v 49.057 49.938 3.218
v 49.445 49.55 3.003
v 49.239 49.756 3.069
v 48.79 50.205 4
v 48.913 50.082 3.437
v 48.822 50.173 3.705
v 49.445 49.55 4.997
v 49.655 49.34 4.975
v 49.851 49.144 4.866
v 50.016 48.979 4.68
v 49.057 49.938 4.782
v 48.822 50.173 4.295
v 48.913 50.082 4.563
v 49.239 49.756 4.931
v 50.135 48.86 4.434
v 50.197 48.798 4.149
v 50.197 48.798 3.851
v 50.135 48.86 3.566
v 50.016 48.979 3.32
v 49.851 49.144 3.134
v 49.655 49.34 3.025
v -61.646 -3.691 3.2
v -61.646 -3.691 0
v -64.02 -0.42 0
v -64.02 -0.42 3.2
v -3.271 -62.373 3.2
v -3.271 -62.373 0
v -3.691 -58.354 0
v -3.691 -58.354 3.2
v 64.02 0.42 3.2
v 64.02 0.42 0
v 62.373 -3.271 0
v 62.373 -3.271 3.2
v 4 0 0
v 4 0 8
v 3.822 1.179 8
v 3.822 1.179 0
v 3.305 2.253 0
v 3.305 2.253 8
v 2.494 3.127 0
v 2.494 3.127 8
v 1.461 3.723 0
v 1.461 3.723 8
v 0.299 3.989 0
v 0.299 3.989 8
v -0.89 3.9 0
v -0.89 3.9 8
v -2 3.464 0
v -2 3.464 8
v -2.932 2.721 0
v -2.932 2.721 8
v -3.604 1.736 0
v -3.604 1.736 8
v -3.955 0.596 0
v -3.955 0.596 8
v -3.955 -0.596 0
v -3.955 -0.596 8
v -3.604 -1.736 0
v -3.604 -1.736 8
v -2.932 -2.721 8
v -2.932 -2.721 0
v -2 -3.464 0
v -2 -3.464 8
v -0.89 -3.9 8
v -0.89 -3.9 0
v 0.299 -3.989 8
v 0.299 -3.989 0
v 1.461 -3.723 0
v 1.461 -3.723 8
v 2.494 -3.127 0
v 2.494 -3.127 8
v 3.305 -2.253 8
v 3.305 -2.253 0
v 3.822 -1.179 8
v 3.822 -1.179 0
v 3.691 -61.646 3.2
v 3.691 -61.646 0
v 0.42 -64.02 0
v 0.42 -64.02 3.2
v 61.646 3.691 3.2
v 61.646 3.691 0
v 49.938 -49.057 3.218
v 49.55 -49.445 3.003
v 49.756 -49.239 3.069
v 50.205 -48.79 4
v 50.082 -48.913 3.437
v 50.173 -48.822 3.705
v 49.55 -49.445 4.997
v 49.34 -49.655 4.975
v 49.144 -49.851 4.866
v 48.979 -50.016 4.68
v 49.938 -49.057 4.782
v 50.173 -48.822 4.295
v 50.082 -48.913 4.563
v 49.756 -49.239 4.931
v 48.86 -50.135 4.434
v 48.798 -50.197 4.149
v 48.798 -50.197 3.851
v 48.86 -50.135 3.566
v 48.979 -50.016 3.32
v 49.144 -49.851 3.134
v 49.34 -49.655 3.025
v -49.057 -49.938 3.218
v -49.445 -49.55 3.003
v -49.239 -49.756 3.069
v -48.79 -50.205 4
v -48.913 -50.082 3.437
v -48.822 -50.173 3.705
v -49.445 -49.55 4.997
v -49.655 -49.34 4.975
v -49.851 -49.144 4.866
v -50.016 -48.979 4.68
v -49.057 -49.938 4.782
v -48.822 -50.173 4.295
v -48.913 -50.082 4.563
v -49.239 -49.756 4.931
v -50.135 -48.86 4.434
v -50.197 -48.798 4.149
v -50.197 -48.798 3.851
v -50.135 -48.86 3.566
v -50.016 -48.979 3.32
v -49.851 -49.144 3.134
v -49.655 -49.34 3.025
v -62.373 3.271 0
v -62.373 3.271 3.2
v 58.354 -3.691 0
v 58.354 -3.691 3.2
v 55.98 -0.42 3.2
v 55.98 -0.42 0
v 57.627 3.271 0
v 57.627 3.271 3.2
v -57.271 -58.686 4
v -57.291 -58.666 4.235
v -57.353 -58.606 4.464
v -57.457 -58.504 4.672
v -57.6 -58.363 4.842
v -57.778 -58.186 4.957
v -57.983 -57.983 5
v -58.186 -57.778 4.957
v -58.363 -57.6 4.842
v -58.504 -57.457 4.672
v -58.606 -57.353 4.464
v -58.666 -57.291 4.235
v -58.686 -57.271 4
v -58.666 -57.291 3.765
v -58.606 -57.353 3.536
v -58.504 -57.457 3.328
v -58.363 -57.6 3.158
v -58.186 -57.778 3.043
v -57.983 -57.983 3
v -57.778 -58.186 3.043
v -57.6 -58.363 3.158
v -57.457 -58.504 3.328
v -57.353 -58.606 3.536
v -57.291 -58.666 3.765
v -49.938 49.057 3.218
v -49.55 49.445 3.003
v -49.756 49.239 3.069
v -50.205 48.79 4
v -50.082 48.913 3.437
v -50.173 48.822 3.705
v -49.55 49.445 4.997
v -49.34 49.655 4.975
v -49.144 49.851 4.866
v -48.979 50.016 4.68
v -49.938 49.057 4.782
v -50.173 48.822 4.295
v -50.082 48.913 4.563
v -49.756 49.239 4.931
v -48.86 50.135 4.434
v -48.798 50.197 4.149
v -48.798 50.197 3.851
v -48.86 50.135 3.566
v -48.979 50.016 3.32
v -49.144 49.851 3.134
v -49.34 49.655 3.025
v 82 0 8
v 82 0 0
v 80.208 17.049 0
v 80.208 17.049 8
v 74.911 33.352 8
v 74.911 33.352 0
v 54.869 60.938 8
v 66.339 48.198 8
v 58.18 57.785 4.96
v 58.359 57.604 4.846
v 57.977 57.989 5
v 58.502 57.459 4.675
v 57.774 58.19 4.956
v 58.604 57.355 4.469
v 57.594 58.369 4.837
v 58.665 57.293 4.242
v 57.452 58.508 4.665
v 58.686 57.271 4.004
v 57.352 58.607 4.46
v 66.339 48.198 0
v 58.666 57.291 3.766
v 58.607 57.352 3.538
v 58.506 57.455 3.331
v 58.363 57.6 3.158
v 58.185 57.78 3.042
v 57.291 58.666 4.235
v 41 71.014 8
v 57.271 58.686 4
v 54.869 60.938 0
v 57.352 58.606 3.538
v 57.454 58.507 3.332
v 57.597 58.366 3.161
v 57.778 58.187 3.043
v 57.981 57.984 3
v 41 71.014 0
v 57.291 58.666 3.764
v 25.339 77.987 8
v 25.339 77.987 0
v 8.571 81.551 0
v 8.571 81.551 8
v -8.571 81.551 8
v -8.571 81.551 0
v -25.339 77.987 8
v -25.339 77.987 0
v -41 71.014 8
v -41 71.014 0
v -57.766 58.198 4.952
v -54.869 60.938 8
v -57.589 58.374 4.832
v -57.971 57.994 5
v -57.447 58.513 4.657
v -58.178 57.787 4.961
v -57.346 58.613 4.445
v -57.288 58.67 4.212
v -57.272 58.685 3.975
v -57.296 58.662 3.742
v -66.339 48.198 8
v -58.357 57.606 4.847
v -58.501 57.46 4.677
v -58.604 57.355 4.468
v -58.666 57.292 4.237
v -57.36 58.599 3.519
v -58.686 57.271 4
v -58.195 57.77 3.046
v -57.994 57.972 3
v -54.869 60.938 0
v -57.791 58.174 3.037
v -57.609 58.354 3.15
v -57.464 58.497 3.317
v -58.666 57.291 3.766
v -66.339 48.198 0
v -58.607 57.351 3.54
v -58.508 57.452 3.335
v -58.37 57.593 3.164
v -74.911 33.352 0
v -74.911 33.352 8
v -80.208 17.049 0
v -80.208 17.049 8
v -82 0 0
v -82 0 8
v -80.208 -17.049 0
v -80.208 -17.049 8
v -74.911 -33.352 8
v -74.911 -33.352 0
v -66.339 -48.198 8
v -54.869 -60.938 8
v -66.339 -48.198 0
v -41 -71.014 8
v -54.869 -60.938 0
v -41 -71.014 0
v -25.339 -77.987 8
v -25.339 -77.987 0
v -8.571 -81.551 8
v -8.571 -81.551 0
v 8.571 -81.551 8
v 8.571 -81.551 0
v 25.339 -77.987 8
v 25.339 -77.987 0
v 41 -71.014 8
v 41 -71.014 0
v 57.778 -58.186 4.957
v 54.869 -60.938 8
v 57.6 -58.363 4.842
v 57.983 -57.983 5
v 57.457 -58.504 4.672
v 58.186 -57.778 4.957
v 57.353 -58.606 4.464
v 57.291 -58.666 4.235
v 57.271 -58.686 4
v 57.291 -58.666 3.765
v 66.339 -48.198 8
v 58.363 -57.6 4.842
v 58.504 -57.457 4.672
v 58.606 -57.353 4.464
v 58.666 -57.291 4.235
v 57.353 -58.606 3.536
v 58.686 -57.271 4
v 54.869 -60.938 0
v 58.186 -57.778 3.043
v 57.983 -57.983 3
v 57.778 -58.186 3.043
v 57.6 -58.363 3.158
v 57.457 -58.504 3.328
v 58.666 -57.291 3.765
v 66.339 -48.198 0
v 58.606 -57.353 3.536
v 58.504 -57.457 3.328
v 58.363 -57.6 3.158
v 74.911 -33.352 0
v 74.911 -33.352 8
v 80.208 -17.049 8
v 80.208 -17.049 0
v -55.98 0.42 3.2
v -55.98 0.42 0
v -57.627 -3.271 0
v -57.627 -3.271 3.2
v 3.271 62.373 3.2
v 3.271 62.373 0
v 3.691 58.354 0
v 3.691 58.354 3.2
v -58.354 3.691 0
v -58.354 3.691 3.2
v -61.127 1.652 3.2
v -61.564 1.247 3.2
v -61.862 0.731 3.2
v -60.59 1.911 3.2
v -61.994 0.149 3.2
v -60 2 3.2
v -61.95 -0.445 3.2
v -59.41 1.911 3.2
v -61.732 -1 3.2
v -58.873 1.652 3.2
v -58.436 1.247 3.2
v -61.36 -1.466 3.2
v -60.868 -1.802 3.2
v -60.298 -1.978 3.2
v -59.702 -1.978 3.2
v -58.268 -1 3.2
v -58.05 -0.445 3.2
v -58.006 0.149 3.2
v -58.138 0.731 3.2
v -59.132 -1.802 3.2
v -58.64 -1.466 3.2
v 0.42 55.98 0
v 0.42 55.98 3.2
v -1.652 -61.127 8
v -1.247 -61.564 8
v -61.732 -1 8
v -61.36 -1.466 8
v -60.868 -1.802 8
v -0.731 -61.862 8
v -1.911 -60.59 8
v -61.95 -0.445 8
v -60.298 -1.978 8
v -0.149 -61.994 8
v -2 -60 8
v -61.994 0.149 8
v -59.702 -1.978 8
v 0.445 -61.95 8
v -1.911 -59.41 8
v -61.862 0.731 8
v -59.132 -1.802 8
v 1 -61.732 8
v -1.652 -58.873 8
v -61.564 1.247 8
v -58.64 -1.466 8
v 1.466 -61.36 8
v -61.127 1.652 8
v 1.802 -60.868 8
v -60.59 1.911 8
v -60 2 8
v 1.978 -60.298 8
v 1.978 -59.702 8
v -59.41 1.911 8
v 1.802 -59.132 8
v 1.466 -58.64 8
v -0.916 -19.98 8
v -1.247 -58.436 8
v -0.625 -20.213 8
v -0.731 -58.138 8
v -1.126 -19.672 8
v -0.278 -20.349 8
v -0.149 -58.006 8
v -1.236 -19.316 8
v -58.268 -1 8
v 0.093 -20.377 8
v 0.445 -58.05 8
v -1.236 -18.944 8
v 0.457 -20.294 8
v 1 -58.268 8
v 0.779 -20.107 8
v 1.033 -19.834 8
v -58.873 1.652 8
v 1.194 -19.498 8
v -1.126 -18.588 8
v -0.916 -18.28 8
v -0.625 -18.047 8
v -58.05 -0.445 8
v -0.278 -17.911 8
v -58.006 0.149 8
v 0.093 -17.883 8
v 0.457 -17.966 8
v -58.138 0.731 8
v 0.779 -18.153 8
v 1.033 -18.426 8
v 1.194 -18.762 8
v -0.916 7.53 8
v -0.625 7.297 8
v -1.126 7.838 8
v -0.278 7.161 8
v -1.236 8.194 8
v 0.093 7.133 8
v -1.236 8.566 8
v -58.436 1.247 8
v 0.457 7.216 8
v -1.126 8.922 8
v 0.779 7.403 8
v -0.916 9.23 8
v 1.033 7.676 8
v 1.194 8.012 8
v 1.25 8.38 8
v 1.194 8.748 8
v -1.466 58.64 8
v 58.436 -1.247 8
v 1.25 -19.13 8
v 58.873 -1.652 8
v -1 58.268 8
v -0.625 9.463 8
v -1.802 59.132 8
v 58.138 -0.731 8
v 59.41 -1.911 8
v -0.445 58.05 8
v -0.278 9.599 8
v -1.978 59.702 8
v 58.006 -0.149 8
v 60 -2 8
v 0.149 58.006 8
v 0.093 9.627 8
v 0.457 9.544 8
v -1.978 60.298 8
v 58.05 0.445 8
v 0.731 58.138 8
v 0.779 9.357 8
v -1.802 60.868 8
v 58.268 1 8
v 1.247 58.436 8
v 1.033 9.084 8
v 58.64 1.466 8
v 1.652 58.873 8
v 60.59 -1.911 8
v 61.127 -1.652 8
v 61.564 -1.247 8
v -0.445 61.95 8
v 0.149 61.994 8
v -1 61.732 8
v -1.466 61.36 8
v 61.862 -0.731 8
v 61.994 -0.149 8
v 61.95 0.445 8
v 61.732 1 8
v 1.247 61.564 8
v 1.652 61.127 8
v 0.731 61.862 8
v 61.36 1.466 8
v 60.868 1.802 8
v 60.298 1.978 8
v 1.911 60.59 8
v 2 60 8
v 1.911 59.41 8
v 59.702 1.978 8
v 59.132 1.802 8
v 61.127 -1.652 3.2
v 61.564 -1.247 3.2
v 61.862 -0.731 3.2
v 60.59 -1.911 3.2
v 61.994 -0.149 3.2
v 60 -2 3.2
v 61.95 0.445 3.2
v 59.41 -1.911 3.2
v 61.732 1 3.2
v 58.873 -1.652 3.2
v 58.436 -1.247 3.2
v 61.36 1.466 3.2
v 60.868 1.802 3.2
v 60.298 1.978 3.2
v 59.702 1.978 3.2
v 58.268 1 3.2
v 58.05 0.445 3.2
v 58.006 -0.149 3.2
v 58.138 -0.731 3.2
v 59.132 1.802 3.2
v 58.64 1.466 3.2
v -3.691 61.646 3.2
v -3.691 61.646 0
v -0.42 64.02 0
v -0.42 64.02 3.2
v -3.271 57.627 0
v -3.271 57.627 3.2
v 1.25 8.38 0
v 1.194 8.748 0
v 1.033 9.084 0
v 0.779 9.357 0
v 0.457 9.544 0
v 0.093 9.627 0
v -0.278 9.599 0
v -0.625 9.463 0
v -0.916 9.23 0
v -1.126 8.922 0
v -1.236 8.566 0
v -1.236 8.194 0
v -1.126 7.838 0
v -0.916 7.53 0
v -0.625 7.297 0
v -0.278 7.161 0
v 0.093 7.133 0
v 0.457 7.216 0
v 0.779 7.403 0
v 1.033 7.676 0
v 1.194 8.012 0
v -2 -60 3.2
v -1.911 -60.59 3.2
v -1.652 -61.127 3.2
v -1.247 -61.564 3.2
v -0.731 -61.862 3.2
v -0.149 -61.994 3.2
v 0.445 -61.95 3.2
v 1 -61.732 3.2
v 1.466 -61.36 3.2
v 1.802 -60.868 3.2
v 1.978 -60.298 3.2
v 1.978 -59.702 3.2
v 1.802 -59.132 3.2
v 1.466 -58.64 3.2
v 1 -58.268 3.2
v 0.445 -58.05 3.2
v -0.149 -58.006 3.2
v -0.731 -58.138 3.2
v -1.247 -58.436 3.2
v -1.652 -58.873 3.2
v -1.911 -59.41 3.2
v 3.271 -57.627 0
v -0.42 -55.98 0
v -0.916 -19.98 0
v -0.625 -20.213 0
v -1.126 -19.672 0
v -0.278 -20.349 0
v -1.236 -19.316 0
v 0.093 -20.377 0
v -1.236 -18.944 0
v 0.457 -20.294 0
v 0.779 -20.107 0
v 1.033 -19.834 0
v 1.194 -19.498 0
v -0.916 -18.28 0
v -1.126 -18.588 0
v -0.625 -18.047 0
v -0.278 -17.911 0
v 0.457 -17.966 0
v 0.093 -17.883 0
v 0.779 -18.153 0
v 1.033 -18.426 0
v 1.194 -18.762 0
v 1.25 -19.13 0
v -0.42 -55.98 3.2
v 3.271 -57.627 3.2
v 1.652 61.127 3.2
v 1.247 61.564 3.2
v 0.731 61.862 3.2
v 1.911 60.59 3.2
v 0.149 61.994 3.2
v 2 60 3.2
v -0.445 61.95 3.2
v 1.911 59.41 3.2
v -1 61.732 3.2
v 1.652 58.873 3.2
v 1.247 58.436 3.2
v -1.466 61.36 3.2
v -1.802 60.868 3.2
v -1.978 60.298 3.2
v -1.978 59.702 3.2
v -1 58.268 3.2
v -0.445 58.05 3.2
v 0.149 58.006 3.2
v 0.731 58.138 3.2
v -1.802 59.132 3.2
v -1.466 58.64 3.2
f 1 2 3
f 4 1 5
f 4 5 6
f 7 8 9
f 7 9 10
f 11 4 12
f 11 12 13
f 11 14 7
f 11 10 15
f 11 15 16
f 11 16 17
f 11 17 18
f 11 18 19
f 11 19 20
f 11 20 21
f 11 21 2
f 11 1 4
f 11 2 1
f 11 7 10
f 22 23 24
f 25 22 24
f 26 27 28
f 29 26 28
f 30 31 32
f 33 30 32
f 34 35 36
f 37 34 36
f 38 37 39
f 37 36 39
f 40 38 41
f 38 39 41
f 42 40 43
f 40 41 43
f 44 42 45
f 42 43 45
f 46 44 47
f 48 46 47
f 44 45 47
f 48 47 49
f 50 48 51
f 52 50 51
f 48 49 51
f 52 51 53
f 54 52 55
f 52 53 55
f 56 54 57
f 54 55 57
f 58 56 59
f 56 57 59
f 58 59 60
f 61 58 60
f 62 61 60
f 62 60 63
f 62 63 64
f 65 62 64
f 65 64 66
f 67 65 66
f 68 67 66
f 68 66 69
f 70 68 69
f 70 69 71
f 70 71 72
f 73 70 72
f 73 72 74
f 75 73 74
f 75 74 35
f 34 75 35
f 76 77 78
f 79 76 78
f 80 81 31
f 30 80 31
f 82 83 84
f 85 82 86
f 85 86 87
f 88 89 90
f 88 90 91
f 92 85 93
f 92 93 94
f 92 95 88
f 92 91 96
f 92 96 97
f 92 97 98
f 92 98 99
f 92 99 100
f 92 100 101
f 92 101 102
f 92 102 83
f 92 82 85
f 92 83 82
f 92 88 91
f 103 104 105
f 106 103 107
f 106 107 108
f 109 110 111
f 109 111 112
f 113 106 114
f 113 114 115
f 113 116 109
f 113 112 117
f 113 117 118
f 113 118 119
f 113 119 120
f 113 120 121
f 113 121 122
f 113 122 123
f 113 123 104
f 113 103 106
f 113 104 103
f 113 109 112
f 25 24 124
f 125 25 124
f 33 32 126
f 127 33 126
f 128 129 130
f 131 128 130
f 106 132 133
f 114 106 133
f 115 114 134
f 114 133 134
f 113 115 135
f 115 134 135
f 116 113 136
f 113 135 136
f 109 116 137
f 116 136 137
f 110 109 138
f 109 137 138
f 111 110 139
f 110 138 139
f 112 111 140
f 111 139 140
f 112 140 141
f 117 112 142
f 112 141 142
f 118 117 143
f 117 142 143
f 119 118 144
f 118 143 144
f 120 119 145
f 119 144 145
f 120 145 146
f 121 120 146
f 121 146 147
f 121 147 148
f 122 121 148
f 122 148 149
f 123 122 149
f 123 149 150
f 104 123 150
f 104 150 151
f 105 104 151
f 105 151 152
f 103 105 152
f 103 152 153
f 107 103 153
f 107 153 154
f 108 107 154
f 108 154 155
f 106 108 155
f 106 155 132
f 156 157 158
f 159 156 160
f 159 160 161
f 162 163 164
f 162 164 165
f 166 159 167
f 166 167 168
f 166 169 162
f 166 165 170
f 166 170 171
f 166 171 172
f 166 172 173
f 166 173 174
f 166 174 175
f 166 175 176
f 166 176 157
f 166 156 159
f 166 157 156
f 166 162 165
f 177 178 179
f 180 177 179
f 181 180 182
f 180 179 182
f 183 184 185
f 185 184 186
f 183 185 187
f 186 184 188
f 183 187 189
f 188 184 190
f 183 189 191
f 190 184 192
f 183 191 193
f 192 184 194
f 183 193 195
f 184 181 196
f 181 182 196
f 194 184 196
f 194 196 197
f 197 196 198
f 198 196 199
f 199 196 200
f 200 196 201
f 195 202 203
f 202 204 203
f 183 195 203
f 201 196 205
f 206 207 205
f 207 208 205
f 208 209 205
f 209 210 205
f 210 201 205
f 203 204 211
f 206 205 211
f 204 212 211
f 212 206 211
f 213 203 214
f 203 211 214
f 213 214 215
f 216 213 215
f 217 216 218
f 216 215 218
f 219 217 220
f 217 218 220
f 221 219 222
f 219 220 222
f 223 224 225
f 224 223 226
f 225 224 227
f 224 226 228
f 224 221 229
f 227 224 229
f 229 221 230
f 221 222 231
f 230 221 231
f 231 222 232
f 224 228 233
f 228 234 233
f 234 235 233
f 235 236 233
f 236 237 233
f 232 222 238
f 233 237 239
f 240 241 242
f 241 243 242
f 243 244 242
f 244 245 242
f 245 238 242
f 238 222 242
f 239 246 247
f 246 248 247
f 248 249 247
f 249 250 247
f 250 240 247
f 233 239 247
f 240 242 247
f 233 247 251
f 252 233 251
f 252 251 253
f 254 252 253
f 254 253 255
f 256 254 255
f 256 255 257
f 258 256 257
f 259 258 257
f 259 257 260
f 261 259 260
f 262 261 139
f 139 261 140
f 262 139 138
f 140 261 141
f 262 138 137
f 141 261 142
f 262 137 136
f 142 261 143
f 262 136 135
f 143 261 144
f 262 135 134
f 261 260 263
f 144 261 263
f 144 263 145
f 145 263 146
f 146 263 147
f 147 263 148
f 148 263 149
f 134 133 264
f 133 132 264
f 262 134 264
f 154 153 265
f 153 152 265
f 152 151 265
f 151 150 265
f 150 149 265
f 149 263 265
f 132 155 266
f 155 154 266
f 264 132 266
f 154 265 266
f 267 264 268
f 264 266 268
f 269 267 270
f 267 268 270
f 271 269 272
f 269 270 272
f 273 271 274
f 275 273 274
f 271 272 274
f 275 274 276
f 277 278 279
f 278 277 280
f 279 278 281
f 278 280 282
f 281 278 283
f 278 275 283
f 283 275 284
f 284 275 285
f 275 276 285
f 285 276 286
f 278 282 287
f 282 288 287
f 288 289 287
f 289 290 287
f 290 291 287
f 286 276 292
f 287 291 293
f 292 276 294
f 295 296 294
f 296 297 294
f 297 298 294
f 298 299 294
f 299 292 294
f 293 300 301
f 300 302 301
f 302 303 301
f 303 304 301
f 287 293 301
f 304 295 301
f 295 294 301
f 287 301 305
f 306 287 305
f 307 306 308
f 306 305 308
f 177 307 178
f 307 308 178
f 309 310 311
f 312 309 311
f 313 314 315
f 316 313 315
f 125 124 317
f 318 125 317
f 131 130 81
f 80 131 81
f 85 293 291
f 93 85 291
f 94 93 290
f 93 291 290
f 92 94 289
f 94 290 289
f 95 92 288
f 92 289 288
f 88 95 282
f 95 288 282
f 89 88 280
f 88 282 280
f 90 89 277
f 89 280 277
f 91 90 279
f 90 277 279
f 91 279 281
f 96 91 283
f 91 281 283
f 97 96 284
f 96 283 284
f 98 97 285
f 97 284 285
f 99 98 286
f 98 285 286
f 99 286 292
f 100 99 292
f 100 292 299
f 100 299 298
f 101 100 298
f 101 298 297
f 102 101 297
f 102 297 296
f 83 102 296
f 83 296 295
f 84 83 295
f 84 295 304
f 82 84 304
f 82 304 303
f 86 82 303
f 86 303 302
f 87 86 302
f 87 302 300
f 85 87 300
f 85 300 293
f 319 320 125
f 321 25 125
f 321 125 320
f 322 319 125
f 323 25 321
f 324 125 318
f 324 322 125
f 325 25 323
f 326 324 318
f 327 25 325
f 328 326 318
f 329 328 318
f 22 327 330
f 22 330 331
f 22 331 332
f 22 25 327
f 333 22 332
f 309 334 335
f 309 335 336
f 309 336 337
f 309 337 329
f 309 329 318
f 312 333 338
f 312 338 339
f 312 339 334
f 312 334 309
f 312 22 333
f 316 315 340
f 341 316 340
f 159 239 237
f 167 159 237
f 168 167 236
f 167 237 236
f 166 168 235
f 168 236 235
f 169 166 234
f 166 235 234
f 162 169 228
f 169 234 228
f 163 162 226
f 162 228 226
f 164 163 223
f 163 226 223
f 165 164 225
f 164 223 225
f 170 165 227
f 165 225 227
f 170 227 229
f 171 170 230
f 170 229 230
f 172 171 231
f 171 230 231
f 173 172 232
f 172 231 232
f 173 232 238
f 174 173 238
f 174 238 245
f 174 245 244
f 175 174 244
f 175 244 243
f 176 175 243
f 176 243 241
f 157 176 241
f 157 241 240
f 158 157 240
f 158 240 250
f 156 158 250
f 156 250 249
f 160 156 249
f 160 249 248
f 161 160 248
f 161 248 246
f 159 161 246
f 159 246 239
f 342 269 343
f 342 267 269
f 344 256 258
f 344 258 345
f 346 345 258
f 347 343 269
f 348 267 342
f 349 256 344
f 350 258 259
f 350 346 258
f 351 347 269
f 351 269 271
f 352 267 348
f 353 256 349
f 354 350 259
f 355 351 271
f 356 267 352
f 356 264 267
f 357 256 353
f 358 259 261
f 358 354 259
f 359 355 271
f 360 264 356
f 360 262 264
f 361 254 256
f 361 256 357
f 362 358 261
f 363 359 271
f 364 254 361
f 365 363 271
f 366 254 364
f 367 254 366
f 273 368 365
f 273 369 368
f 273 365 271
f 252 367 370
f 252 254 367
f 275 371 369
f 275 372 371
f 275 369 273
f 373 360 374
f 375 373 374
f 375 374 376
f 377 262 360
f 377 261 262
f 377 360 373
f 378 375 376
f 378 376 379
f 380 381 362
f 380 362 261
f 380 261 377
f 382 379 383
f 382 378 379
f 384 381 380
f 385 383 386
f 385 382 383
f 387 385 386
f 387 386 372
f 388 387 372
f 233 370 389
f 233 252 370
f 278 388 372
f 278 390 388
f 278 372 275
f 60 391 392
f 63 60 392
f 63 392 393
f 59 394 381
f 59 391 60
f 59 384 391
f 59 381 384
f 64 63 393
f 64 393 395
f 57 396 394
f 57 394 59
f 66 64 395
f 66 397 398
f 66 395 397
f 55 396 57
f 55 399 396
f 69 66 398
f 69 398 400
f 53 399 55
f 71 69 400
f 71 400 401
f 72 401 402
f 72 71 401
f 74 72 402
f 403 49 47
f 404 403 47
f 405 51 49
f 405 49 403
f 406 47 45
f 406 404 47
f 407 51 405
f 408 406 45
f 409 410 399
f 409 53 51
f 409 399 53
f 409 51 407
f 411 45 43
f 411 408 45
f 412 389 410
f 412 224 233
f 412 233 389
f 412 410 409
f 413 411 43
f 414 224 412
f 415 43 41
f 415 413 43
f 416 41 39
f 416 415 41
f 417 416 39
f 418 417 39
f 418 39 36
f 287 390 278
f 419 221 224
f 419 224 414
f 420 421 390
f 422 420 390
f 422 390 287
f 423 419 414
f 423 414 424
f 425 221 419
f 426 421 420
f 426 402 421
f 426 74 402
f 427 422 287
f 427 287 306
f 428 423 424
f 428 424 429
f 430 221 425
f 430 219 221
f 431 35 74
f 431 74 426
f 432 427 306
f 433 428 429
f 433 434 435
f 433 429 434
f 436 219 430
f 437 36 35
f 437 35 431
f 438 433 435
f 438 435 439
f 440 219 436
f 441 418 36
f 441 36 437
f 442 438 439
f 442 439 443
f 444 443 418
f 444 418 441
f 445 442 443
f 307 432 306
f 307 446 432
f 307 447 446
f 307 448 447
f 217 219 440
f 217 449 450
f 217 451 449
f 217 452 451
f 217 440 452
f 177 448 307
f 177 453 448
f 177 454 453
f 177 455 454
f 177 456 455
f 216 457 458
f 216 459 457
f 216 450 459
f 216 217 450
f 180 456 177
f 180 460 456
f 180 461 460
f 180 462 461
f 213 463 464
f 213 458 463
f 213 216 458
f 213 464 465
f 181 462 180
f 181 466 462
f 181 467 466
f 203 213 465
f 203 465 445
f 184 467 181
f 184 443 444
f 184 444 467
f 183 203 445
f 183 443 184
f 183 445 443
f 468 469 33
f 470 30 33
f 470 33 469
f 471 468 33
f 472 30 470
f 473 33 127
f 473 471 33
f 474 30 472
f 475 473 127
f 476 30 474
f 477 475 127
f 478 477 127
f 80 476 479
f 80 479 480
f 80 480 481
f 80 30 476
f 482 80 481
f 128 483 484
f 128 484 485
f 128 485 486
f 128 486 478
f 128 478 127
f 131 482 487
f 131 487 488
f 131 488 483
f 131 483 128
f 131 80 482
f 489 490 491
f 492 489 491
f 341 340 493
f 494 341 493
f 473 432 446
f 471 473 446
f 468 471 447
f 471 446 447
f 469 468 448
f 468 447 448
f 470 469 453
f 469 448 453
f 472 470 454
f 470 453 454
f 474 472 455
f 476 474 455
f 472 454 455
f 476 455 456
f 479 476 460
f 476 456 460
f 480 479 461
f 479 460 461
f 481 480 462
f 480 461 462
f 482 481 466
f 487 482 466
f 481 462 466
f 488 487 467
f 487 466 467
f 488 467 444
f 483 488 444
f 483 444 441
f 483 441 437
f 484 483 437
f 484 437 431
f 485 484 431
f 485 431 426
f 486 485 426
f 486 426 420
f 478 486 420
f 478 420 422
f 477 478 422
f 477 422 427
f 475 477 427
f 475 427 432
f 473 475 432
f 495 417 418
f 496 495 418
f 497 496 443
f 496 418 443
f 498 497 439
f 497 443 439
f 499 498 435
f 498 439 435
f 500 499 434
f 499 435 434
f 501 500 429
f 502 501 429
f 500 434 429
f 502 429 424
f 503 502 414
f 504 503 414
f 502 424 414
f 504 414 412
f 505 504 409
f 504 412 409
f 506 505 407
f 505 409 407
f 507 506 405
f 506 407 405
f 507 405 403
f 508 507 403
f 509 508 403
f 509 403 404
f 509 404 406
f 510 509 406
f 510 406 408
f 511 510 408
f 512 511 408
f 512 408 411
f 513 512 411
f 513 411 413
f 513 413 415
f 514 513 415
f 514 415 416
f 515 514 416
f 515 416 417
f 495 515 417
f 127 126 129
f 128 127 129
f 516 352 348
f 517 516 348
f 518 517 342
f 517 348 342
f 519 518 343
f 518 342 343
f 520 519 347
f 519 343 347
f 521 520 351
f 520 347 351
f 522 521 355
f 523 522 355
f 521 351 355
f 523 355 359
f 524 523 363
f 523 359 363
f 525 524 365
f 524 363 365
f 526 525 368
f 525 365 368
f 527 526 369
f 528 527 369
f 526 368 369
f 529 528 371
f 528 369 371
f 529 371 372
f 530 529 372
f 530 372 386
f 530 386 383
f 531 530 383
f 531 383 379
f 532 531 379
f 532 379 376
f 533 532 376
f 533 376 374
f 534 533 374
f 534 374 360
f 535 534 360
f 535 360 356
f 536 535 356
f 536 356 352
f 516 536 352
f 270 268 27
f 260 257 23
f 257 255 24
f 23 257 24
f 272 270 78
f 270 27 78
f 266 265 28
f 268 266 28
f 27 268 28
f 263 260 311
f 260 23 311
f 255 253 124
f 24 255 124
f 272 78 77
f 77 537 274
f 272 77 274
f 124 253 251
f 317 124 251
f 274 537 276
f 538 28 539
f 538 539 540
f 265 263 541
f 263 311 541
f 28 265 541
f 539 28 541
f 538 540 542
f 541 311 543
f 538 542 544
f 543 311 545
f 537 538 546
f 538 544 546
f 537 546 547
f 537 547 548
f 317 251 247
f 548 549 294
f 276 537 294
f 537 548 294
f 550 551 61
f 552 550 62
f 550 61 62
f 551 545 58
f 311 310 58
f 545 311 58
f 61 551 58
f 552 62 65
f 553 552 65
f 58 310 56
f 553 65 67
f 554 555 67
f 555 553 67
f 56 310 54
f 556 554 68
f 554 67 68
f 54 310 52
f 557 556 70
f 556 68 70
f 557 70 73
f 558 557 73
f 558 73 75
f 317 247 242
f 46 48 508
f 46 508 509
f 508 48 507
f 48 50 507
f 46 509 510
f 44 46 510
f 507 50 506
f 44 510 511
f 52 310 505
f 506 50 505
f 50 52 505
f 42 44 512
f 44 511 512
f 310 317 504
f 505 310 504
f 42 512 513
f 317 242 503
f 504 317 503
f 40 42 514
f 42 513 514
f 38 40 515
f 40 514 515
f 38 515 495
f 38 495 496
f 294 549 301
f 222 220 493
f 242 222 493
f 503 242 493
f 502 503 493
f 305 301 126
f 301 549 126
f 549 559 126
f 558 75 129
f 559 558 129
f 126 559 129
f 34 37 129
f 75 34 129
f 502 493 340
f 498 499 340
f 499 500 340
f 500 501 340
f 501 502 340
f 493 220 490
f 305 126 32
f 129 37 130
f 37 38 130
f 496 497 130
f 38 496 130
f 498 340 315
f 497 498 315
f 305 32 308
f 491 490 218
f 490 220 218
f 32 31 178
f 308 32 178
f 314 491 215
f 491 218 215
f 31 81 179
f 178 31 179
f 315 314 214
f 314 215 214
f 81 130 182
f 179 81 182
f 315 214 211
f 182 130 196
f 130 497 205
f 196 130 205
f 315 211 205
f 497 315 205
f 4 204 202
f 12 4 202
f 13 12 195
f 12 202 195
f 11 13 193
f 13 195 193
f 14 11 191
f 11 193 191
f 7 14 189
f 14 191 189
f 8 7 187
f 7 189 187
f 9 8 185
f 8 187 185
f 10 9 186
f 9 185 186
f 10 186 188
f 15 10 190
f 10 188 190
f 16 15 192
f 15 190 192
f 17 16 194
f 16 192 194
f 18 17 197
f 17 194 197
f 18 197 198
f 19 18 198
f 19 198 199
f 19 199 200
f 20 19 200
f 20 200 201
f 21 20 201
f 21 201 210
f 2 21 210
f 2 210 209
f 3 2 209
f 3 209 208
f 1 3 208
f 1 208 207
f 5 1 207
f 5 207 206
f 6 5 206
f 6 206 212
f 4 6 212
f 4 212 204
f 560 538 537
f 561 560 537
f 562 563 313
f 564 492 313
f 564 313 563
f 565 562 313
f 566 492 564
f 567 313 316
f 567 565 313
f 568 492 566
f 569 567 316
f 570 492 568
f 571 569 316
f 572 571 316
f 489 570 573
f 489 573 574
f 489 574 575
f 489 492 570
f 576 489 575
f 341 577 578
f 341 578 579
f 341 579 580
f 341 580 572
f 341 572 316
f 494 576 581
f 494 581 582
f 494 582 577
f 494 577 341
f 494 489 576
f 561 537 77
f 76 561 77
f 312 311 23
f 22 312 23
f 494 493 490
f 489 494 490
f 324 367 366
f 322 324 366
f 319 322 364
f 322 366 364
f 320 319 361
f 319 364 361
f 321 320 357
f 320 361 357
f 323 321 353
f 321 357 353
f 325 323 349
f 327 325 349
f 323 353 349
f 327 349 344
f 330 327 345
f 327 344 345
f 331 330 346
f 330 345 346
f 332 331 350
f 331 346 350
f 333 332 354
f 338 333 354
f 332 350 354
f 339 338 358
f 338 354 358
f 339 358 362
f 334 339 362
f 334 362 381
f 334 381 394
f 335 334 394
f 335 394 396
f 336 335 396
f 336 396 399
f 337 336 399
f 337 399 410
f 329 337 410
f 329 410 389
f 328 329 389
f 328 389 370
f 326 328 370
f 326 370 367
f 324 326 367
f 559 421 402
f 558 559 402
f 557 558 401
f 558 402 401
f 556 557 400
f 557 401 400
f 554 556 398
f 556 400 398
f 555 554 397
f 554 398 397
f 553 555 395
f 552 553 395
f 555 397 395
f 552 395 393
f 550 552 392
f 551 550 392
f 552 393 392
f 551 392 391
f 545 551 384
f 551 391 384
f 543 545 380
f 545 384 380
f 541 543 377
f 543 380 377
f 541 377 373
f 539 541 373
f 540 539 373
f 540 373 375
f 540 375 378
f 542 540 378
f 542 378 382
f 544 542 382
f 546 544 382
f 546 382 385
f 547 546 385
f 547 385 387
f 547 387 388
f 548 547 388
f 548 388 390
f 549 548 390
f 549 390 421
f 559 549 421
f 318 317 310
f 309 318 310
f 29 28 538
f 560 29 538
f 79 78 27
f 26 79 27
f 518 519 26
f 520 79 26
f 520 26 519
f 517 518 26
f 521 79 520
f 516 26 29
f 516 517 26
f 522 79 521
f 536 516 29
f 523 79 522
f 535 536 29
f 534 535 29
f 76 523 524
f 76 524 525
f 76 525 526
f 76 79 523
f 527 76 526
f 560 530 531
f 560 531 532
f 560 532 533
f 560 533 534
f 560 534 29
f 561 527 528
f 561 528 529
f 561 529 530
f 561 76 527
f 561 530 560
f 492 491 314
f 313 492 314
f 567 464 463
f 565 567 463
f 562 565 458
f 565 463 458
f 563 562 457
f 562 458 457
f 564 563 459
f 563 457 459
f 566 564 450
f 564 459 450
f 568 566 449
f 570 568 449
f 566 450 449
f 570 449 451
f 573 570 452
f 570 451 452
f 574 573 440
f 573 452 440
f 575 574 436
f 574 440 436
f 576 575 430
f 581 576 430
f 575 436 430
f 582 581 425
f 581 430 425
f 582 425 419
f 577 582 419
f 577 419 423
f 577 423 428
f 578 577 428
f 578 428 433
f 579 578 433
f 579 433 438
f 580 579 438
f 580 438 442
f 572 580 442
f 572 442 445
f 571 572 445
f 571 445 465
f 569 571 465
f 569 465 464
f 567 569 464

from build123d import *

# Parameters (mm, degrees)
SKETCH1_R           = 82
BOSS_EXTRUDE1_DEPTH = 8
SKETCH2_R           = 2
CUT_EXTRUDE1_DEPTH  = 8
CIRPATTERN1_COUNT   = 4
SKETCH3_R           = 4
SKETCH3_R_2         = 1.25
CUT_EXTRUDE2_DEPTH  = 10
CUT_EXTRUDE3_DEPTH  = 3.2
SKETCH5_R           = 1
CUT_EXTRUDE4_DEPTH  = 12
CIRPATTERN2_COUNT   = 4
CIRPATTERN3_COUNT   = 4


with BuildPart() as part:
    # Sketch1 → Boss-Extrude1 (new body)
    with BuildSketch(Plane.XY):
        Circle(SKETCH1_R)
    extrude(amount=BOSS_EXTRUDE1_DEPTH)

    # Sketch2 → Cut-Extrude1 (cut)
    with BuildSketch(Plane.XY.offset(8)):
        with Locations((0, 60)):
            Circle(SKETCH2_R)
    cut_extrude1 = extrude(amount=-CUT_EXTRUDE1_DEPTH, mode=Mode.SUBTRACT)

    # CirPattern1: Cut-Extrude1 ×4 about axis
    cirpattern1_axis = Axis((0, 0, 0), (0, 0, 1))
    for i in range(1, CIRPATTERN1_COUNT):
        add(cut_extrude1.rotate(cirpattern1_axis, i * 360 / CIRPATTERN1_COUNT), mode=Mode.SUBTRACT)

    # Sketch3 → Cut-Extrude2 (cut)
    with BuildSketch(Plane.XY.offset(8)):
        Circle(SKETCH3_R)
        with Locations((0, 8.38)):
            Circle(SKETCH3_R_2)
        with Locations((0, -19.13)):
            Circle(SKETCH3_R_2)
    extrude(amount=-CUT_EXTRUDE2_DEPTH, mode=Mode.SUBTRACT)

    # Sketch4 → Cut-Extrude3 (cut)
    with BuildSketch(Plane(origin=(0, 0, 0), x_dir=(-1, 0, 0), z_dir=(0, 0, -1))):
        Polygon((-162.322467781, -20.961900653), (-166.013325515, -22.608382515), (-166.432859263, -26.628000005), (-163.161535277, -29.001135634), (-159.470677543, -27.354653772), (-159.051143795, -23.335036282), align=None)
        Polygon((-64.01961749, 0.419533748), (-62.373135629, -3.271323986), (-58.353518138, -3.690857734), (-55.98038251, -0.419533748), (-57.626864371, 3.271323986), (-61.646481862, 3.690857734), align=None)
        Polygon((-183.703902182, 77.340949637), (-185.350384043, 81.031807371), (-189.370001534, 81.451341119), (-191.743137162, 78.180017133), (-190.0966553, 74.489159399), (-186.07703781, 74.069625651), align=None)
        Polygon((-85.401051891, 98.722384038), (-81.710194157, 100.3688659), (-81.290660409, 104.38848339), (-84.561984395, 106.761619019), (-88.252842129, 105.115137157), (-88.672375877, 101.095519667), align=None)
    cut_extrude3 = extrude(amount=-CUT_EXTRUDE3_DEPTH, mode=Mode.SUBTRACT)

    # Sketch5 → Cut-Extrude4 (cut)
    with BuildSketch(Plane(origin=(-57.982756057, 57.982756057, 0), x_dir=(0.7071067811865477, 0.7071067811865475, 0), z_dir=(-0.7071067811865475, 0.7071067811865477, 0))):
        with Locations(Location((0, -4, 0), (0, 0, 180))):
            Circle(SKETCH5_R)
    cut_extrude4 = extrude(amount=-CUT_EXTRUDE4_DEPTH, mode=Mode.SUBTRACT)

    # CirPattern2: Cut-Extrude4 ×4 about axis
    cirpattern2_axis = Axis((0, 0, 0), (0, 0, 1))
    for i in range(1, CIRPATTERN2_COUNT):
        add(cut_extrude4.rotate(cirpattern2_axis, i * 360 / CIRPATTERN2_COUNT), mode=Mode.SUBTRACT)

    # CirPattern3: Cut-Extrude3 ×4 about axis
    cirpattern3_axis = Axis((0, 0, 0), (0, 0, 1))
    for i in range(1, CIRPATTERN3_COUNT):
        add(cut_extrude3.rotate(cirpattern3_axis, i * 360 / CIRPATTERN3_COUNT), mode=Mode.SUBTRACT)


solid = part.part
